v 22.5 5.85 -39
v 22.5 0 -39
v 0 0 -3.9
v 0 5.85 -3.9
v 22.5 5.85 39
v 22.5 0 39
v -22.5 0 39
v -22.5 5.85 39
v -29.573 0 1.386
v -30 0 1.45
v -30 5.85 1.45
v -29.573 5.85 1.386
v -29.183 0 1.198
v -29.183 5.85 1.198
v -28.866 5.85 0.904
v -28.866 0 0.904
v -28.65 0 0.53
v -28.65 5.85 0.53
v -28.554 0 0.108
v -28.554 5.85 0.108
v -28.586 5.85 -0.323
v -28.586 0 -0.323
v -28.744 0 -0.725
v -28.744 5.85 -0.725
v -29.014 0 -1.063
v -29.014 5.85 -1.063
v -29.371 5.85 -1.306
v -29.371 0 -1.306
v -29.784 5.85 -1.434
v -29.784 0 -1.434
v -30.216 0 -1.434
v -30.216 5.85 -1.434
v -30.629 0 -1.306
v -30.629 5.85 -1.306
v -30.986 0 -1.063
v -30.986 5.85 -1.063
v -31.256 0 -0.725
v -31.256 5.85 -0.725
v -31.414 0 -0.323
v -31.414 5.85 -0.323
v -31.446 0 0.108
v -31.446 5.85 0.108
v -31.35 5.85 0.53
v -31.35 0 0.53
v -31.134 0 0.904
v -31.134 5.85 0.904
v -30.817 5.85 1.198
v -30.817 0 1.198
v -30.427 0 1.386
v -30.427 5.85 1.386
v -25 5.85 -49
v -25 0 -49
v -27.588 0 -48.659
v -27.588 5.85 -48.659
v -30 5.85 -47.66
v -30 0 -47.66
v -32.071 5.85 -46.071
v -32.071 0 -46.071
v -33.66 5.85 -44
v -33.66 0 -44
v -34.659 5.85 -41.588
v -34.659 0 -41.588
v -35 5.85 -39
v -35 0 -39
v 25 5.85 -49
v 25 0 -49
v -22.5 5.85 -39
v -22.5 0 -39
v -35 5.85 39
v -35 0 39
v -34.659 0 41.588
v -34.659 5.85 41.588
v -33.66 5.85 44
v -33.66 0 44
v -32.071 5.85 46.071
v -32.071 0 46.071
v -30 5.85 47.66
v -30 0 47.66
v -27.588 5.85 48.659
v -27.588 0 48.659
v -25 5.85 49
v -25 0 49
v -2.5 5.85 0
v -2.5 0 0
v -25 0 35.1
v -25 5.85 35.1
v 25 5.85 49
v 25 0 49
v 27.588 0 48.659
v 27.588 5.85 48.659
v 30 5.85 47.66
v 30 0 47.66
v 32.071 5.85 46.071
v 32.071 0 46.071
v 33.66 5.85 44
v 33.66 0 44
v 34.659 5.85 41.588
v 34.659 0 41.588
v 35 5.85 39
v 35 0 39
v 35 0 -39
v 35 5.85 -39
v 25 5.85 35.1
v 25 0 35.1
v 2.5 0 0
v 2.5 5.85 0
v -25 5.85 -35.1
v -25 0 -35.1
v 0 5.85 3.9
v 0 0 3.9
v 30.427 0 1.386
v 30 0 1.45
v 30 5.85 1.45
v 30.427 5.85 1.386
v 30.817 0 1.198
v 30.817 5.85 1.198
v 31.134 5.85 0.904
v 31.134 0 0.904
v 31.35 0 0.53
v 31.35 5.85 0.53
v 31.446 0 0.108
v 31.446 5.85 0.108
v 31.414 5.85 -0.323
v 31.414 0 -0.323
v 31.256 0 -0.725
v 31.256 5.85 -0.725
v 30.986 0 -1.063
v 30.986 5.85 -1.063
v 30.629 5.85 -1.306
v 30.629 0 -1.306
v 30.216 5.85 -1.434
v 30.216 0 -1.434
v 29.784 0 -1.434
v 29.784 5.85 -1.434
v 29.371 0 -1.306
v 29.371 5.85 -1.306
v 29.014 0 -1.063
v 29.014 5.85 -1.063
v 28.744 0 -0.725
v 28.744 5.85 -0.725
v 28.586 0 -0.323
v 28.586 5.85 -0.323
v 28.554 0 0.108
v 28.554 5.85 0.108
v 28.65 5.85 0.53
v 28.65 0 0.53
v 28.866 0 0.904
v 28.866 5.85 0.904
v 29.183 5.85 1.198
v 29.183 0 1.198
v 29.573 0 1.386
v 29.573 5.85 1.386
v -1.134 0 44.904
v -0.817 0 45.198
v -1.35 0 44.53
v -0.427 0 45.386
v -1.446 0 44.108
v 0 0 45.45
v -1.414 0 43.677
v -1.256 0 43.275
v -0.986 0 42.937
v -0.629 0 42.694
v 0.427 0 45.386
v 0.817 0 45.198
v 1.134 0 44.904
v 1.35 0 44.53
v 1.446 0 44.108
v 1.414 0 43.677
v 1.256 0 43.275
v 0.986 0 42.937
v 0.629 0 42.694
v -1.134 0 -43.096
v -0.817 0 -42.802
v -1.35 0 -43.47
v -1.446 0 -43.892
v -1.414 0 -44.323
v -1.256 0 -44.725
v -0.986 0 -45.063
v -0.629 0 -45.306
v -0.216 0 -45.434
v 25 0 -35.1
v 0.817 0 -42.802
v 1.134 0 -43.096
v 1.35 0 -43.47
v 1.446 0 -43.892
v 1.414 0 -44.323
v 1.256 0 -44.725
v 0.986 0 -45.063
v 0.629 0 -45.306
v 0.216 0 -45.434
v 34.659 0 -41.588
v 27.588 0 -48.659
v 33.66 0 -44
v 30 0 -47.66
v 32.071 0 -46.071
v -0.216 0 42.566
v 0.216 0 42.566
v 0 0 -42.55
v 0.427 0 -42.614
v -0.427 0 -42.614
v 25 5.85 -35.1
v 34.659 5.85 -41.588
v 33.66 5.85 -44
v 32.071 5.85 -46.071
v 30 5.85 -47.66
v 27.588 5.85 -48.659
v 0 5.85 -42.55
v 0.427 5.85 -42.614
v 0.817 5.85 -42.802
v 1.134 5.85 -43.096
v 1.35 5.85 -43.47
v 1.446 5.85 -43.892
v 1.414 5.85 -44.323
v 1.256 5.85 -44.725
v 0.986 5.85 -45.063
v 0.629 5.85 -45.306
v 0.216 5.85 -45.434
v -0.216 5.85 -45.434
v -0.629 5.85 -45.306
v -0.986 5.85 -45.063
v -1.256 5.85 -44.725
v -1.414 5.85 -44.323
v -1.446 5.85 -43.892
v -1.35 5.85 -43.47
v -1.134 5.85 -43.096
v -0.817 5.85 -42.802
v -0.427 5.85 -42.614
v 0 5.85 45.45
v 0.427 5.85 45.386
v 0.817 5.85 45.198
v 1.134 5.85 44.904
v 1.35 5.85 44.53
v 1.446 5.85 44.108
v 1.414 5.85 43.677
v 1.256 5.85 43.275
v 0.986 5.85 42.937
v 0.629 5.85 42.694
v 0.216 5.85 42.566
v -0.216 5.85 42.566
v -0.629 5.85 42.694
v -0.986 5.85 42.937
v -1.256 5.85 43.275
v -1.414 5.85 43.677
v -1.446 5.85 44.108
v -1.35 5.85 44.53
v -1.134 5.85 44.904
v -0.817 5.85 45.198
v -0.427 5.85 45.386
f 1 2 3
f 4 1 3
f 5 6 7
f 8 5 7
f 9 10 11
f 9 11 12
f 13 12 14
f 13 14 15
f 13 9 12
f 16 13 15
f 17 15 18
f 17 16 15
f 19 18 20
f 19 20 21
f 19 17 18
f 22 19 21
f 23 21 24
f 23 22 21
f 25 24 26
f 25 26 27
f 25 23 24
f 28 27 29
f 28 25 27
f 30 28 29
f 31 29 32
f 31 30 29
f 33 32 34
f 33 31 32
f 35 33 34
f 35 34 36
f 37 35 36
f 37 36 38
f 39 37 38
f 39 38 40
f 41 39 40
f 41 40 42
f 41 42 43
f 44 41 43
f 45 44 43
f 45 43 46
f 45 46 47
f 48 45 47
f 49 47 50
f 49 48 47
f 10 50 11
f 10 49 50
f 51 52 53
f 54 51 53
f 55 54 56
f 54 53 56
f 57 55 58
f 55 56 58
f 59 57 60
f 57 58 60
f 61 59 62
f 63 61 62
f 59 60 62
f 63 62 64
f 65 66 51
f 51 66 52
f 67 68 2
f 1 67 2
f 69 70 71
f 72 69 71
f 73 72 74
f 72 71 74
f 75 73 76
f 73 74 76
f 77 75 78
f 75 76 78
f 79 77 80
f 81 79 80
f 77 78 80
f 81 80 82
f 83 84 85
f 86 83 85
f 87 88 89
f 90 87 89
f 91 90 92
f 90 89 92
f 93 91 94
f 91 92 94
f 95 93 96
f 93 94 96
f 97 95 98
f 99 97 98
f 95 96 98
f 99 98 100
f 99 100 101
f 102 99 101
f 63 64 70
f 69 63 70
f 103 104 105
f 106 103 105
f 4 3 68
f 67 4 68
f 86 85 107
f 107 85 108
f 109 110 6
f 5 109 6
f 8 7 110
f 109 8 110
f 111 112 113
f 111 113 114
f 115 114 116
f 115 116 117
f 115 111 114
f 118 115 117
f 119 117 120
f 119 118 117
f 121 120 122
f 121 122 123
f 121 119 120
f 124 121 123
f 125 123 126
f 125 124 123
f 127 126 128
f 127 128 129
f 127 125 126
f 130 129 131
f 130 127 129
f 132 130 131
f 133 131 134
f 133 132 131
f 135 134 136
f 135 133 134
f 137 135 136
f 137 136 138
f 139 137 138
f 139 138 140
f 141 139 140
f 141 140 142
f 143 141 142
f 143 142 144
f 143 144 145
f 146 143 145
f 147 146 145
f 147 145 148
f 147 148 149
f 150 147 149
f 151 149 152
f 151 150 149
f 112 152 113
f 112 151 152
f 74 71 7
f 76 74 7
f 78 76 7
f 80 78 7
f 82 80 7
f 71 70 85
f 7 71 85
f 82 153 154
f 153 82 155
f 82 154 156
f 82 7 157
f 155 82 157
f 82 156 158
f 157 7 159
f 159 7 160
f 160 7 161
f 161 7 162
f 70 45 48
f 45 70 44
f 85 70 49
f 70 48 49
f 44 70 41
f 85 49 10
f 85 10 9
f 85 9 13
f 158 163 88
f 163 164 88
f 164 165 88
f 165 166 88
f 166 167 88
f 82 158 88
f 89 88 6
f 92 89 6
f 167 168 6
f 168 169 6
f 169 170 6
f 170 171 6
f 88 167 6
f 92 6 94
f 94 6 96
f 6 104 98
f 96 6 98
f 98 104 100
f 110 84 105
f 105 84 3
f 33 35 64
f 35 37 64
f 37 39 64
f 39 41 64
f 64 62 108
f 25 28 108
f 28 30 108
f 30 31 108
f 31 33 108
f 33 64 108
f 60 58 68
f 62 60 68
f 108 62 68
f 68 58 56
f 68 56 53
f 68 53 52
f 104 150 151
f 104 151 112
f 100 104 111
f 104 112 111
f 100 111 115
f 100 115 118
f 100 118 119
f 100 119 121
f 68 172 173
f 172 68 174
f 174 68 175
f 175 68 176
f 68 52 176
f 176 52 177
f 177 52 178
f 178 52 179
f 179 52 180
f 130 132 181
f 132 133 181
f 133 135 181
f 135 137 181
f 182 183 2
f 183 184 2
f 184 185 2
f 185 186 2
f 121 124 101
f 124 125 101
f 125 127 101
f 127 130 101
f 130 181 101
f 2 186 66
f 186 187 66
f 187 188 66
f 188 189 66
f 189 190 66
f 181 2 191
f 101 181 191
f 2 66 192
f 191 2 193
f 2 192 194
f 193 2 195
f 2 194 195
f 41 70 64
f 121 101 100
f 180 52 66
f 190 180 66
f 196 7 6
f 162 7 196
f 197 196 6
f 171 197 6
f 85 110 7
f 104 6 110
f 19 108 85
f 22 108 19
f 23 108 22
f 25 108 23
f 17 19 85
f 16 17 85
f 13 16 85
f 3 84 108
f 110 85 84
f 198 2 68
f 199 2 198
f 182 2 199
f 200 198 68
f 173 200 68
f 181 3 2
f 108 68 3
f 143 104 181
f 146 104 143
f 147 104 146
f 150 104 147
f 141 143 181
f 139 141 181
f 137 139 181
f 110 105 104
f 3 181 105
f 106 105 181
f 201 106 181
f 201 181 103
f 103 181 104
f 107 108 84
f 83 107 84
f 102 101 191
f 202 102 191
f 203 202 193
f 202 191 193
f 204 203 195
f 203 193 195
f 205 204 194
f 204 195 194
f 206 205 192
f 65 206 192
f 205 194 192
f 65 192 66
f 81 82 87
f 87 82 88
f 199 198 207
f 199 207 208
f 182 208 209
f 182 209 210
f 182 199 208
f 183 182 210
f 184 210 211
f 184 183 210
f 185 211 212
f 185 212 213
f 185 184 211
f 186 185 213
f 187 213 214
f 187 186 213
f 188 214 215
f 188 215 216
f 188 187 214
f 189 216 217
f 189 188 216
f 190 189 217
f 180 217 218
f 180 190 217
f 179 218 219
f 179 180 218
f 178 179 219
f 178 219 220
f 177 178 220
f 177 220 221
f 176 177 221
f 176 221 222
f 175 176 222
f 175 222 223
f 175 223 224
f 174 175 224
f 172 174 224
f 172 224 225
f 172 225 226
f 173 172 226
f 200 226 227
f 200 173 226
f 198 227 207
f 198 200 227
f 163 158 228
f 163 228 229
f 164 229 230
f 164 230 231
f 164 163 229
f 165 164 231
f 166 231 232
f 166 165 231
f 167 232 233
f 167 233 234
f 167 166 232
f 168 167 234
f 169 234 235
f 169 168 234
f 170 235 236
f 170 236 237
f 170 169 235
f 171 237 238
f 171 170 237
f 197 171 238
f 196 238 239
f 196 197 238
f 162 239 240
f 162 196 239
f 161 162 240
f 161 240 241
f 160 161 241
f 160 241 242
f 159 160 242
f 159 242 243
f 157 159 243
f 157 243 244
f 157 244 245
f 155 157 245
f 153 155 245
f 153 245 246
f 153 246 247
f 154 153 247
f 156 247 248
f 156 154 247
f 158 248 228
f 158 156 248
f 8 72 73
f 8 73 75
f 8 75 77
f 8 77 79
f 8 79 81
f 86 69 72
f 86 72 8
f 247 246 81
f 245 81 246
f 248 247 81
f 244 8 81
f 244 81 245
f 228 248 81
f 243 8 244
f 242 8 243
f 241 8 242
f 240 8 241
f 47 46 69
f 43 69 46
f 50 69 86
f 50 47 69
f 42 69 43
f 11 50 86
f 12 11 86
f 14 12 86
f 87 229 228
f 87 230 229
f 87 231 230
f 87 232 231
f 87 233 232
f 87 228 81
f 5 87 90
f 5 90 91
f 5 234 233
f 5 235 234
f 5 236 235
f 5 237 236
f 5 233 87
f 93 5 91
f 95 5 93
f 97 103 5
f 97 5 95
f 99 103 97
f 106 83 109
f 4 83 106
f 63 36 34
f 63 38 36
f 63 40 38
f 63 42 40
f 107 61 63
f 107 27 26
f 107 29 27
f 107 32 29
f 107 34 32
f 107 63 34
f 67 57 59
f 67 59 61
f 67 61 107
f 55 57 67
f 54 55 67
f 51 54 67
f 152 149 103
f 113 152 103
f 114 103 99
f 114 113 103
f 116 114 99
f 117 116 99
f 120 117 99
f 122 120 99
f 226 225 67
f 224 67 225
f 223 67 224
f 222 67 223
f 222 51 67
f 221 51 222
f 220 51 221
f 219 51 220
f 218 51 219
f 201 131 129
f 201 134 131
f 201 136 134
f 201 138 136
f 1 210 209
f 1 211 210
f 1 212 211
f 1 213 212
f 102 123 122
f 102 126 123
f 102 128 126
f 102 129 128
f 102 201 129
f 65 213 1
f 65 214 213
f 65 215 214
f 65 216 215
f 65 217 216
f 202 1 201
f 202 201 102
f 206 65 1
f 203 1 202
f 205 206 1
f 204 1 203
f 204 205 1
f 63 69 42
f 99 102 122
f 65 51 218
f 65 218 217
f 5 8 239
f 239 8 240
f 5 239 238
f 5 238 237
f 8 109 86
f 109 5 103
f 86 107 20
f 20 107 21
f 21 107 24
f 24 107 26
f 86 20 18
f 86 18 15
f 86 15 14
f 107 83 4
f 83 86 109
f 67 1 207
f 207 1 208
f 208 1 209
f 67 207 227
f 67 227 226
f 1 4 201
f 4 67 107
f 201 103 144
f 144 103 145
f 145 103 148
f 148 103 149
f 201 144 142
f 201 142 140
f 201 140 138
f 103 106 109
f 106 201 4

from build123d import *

# Parameters (mm, degrees)
SKETCH1_R           = 1.45
BOSS_EXTRUDE1_DEPTH = 5.85


with BuildPart() as part:
    # Sketch1 → Boss-Extrude1 (new body)
    with BuildSketch(Plane(origin=(0, 0, 0), x_dir=(1, 0, 0), z_dir=(0, 1, 0))):
        with BuildLine():
            ThreePointArc((-25, 49), (-32.071067812, 46.071067812), (-35, 39))
            Line((-35, 39), (-35, -39))
            ThreePointArc((-35, -39), (-32.071067812, -46.071067812), (-25, -49))
            Line((-25, -49), (25, -49))
            ThreePointArc((25, -49), (32.071067812, -46.071067812), (35, -39))
            Line((35, -39), (35, 39))
            ThreePointArc((35, 39), (32.071067812, 46.071067812), (25, 49))
            Line((25, 49), (-25, 49))
        make_face()
        Polygon((-22.5, -39), (0, -3.9), (22.5, -39), align=None, mode=Mode.SUBTRACT)
        Polygon((25, -35.1), (2.5, 0), (25, 35.1), align=None, mode=Mode.SUBTRACT)
        Polygon((22.5, 39), (0, 3.9), (-22.5, 39), align=None, mode=Mode.SUBTRACT)
        Polygon((-25, 35.1), (-2.5, 0), (-25, -35.1), align=None, mode=Mode.SUBTRACT)
        with Locations(Location((0, -44, 0), (0, 0, 270))):
            Circle(SKETCH1_R, mode=Mode.SUBTRACT)
        with Locations(Location((-30, 0, 0), (0, 0, 270))):
            Circle(SKETCH1_R, mode=Mode.SUBTRACT)
        with Locations(Location((0, 44, 0), (0, 0, 270))):
            Circle(SKETCH1_R, mode=Mode.SUBTRACT)
        with Locations(Location((30, 0, 0), (0, 0, 270))):
            Circle(SKETCH1_R, mode=Mode.SUBTRACT)
    extrude(amount=BOSS_EXTRUDE1_DEPTH)


solid = part.part
